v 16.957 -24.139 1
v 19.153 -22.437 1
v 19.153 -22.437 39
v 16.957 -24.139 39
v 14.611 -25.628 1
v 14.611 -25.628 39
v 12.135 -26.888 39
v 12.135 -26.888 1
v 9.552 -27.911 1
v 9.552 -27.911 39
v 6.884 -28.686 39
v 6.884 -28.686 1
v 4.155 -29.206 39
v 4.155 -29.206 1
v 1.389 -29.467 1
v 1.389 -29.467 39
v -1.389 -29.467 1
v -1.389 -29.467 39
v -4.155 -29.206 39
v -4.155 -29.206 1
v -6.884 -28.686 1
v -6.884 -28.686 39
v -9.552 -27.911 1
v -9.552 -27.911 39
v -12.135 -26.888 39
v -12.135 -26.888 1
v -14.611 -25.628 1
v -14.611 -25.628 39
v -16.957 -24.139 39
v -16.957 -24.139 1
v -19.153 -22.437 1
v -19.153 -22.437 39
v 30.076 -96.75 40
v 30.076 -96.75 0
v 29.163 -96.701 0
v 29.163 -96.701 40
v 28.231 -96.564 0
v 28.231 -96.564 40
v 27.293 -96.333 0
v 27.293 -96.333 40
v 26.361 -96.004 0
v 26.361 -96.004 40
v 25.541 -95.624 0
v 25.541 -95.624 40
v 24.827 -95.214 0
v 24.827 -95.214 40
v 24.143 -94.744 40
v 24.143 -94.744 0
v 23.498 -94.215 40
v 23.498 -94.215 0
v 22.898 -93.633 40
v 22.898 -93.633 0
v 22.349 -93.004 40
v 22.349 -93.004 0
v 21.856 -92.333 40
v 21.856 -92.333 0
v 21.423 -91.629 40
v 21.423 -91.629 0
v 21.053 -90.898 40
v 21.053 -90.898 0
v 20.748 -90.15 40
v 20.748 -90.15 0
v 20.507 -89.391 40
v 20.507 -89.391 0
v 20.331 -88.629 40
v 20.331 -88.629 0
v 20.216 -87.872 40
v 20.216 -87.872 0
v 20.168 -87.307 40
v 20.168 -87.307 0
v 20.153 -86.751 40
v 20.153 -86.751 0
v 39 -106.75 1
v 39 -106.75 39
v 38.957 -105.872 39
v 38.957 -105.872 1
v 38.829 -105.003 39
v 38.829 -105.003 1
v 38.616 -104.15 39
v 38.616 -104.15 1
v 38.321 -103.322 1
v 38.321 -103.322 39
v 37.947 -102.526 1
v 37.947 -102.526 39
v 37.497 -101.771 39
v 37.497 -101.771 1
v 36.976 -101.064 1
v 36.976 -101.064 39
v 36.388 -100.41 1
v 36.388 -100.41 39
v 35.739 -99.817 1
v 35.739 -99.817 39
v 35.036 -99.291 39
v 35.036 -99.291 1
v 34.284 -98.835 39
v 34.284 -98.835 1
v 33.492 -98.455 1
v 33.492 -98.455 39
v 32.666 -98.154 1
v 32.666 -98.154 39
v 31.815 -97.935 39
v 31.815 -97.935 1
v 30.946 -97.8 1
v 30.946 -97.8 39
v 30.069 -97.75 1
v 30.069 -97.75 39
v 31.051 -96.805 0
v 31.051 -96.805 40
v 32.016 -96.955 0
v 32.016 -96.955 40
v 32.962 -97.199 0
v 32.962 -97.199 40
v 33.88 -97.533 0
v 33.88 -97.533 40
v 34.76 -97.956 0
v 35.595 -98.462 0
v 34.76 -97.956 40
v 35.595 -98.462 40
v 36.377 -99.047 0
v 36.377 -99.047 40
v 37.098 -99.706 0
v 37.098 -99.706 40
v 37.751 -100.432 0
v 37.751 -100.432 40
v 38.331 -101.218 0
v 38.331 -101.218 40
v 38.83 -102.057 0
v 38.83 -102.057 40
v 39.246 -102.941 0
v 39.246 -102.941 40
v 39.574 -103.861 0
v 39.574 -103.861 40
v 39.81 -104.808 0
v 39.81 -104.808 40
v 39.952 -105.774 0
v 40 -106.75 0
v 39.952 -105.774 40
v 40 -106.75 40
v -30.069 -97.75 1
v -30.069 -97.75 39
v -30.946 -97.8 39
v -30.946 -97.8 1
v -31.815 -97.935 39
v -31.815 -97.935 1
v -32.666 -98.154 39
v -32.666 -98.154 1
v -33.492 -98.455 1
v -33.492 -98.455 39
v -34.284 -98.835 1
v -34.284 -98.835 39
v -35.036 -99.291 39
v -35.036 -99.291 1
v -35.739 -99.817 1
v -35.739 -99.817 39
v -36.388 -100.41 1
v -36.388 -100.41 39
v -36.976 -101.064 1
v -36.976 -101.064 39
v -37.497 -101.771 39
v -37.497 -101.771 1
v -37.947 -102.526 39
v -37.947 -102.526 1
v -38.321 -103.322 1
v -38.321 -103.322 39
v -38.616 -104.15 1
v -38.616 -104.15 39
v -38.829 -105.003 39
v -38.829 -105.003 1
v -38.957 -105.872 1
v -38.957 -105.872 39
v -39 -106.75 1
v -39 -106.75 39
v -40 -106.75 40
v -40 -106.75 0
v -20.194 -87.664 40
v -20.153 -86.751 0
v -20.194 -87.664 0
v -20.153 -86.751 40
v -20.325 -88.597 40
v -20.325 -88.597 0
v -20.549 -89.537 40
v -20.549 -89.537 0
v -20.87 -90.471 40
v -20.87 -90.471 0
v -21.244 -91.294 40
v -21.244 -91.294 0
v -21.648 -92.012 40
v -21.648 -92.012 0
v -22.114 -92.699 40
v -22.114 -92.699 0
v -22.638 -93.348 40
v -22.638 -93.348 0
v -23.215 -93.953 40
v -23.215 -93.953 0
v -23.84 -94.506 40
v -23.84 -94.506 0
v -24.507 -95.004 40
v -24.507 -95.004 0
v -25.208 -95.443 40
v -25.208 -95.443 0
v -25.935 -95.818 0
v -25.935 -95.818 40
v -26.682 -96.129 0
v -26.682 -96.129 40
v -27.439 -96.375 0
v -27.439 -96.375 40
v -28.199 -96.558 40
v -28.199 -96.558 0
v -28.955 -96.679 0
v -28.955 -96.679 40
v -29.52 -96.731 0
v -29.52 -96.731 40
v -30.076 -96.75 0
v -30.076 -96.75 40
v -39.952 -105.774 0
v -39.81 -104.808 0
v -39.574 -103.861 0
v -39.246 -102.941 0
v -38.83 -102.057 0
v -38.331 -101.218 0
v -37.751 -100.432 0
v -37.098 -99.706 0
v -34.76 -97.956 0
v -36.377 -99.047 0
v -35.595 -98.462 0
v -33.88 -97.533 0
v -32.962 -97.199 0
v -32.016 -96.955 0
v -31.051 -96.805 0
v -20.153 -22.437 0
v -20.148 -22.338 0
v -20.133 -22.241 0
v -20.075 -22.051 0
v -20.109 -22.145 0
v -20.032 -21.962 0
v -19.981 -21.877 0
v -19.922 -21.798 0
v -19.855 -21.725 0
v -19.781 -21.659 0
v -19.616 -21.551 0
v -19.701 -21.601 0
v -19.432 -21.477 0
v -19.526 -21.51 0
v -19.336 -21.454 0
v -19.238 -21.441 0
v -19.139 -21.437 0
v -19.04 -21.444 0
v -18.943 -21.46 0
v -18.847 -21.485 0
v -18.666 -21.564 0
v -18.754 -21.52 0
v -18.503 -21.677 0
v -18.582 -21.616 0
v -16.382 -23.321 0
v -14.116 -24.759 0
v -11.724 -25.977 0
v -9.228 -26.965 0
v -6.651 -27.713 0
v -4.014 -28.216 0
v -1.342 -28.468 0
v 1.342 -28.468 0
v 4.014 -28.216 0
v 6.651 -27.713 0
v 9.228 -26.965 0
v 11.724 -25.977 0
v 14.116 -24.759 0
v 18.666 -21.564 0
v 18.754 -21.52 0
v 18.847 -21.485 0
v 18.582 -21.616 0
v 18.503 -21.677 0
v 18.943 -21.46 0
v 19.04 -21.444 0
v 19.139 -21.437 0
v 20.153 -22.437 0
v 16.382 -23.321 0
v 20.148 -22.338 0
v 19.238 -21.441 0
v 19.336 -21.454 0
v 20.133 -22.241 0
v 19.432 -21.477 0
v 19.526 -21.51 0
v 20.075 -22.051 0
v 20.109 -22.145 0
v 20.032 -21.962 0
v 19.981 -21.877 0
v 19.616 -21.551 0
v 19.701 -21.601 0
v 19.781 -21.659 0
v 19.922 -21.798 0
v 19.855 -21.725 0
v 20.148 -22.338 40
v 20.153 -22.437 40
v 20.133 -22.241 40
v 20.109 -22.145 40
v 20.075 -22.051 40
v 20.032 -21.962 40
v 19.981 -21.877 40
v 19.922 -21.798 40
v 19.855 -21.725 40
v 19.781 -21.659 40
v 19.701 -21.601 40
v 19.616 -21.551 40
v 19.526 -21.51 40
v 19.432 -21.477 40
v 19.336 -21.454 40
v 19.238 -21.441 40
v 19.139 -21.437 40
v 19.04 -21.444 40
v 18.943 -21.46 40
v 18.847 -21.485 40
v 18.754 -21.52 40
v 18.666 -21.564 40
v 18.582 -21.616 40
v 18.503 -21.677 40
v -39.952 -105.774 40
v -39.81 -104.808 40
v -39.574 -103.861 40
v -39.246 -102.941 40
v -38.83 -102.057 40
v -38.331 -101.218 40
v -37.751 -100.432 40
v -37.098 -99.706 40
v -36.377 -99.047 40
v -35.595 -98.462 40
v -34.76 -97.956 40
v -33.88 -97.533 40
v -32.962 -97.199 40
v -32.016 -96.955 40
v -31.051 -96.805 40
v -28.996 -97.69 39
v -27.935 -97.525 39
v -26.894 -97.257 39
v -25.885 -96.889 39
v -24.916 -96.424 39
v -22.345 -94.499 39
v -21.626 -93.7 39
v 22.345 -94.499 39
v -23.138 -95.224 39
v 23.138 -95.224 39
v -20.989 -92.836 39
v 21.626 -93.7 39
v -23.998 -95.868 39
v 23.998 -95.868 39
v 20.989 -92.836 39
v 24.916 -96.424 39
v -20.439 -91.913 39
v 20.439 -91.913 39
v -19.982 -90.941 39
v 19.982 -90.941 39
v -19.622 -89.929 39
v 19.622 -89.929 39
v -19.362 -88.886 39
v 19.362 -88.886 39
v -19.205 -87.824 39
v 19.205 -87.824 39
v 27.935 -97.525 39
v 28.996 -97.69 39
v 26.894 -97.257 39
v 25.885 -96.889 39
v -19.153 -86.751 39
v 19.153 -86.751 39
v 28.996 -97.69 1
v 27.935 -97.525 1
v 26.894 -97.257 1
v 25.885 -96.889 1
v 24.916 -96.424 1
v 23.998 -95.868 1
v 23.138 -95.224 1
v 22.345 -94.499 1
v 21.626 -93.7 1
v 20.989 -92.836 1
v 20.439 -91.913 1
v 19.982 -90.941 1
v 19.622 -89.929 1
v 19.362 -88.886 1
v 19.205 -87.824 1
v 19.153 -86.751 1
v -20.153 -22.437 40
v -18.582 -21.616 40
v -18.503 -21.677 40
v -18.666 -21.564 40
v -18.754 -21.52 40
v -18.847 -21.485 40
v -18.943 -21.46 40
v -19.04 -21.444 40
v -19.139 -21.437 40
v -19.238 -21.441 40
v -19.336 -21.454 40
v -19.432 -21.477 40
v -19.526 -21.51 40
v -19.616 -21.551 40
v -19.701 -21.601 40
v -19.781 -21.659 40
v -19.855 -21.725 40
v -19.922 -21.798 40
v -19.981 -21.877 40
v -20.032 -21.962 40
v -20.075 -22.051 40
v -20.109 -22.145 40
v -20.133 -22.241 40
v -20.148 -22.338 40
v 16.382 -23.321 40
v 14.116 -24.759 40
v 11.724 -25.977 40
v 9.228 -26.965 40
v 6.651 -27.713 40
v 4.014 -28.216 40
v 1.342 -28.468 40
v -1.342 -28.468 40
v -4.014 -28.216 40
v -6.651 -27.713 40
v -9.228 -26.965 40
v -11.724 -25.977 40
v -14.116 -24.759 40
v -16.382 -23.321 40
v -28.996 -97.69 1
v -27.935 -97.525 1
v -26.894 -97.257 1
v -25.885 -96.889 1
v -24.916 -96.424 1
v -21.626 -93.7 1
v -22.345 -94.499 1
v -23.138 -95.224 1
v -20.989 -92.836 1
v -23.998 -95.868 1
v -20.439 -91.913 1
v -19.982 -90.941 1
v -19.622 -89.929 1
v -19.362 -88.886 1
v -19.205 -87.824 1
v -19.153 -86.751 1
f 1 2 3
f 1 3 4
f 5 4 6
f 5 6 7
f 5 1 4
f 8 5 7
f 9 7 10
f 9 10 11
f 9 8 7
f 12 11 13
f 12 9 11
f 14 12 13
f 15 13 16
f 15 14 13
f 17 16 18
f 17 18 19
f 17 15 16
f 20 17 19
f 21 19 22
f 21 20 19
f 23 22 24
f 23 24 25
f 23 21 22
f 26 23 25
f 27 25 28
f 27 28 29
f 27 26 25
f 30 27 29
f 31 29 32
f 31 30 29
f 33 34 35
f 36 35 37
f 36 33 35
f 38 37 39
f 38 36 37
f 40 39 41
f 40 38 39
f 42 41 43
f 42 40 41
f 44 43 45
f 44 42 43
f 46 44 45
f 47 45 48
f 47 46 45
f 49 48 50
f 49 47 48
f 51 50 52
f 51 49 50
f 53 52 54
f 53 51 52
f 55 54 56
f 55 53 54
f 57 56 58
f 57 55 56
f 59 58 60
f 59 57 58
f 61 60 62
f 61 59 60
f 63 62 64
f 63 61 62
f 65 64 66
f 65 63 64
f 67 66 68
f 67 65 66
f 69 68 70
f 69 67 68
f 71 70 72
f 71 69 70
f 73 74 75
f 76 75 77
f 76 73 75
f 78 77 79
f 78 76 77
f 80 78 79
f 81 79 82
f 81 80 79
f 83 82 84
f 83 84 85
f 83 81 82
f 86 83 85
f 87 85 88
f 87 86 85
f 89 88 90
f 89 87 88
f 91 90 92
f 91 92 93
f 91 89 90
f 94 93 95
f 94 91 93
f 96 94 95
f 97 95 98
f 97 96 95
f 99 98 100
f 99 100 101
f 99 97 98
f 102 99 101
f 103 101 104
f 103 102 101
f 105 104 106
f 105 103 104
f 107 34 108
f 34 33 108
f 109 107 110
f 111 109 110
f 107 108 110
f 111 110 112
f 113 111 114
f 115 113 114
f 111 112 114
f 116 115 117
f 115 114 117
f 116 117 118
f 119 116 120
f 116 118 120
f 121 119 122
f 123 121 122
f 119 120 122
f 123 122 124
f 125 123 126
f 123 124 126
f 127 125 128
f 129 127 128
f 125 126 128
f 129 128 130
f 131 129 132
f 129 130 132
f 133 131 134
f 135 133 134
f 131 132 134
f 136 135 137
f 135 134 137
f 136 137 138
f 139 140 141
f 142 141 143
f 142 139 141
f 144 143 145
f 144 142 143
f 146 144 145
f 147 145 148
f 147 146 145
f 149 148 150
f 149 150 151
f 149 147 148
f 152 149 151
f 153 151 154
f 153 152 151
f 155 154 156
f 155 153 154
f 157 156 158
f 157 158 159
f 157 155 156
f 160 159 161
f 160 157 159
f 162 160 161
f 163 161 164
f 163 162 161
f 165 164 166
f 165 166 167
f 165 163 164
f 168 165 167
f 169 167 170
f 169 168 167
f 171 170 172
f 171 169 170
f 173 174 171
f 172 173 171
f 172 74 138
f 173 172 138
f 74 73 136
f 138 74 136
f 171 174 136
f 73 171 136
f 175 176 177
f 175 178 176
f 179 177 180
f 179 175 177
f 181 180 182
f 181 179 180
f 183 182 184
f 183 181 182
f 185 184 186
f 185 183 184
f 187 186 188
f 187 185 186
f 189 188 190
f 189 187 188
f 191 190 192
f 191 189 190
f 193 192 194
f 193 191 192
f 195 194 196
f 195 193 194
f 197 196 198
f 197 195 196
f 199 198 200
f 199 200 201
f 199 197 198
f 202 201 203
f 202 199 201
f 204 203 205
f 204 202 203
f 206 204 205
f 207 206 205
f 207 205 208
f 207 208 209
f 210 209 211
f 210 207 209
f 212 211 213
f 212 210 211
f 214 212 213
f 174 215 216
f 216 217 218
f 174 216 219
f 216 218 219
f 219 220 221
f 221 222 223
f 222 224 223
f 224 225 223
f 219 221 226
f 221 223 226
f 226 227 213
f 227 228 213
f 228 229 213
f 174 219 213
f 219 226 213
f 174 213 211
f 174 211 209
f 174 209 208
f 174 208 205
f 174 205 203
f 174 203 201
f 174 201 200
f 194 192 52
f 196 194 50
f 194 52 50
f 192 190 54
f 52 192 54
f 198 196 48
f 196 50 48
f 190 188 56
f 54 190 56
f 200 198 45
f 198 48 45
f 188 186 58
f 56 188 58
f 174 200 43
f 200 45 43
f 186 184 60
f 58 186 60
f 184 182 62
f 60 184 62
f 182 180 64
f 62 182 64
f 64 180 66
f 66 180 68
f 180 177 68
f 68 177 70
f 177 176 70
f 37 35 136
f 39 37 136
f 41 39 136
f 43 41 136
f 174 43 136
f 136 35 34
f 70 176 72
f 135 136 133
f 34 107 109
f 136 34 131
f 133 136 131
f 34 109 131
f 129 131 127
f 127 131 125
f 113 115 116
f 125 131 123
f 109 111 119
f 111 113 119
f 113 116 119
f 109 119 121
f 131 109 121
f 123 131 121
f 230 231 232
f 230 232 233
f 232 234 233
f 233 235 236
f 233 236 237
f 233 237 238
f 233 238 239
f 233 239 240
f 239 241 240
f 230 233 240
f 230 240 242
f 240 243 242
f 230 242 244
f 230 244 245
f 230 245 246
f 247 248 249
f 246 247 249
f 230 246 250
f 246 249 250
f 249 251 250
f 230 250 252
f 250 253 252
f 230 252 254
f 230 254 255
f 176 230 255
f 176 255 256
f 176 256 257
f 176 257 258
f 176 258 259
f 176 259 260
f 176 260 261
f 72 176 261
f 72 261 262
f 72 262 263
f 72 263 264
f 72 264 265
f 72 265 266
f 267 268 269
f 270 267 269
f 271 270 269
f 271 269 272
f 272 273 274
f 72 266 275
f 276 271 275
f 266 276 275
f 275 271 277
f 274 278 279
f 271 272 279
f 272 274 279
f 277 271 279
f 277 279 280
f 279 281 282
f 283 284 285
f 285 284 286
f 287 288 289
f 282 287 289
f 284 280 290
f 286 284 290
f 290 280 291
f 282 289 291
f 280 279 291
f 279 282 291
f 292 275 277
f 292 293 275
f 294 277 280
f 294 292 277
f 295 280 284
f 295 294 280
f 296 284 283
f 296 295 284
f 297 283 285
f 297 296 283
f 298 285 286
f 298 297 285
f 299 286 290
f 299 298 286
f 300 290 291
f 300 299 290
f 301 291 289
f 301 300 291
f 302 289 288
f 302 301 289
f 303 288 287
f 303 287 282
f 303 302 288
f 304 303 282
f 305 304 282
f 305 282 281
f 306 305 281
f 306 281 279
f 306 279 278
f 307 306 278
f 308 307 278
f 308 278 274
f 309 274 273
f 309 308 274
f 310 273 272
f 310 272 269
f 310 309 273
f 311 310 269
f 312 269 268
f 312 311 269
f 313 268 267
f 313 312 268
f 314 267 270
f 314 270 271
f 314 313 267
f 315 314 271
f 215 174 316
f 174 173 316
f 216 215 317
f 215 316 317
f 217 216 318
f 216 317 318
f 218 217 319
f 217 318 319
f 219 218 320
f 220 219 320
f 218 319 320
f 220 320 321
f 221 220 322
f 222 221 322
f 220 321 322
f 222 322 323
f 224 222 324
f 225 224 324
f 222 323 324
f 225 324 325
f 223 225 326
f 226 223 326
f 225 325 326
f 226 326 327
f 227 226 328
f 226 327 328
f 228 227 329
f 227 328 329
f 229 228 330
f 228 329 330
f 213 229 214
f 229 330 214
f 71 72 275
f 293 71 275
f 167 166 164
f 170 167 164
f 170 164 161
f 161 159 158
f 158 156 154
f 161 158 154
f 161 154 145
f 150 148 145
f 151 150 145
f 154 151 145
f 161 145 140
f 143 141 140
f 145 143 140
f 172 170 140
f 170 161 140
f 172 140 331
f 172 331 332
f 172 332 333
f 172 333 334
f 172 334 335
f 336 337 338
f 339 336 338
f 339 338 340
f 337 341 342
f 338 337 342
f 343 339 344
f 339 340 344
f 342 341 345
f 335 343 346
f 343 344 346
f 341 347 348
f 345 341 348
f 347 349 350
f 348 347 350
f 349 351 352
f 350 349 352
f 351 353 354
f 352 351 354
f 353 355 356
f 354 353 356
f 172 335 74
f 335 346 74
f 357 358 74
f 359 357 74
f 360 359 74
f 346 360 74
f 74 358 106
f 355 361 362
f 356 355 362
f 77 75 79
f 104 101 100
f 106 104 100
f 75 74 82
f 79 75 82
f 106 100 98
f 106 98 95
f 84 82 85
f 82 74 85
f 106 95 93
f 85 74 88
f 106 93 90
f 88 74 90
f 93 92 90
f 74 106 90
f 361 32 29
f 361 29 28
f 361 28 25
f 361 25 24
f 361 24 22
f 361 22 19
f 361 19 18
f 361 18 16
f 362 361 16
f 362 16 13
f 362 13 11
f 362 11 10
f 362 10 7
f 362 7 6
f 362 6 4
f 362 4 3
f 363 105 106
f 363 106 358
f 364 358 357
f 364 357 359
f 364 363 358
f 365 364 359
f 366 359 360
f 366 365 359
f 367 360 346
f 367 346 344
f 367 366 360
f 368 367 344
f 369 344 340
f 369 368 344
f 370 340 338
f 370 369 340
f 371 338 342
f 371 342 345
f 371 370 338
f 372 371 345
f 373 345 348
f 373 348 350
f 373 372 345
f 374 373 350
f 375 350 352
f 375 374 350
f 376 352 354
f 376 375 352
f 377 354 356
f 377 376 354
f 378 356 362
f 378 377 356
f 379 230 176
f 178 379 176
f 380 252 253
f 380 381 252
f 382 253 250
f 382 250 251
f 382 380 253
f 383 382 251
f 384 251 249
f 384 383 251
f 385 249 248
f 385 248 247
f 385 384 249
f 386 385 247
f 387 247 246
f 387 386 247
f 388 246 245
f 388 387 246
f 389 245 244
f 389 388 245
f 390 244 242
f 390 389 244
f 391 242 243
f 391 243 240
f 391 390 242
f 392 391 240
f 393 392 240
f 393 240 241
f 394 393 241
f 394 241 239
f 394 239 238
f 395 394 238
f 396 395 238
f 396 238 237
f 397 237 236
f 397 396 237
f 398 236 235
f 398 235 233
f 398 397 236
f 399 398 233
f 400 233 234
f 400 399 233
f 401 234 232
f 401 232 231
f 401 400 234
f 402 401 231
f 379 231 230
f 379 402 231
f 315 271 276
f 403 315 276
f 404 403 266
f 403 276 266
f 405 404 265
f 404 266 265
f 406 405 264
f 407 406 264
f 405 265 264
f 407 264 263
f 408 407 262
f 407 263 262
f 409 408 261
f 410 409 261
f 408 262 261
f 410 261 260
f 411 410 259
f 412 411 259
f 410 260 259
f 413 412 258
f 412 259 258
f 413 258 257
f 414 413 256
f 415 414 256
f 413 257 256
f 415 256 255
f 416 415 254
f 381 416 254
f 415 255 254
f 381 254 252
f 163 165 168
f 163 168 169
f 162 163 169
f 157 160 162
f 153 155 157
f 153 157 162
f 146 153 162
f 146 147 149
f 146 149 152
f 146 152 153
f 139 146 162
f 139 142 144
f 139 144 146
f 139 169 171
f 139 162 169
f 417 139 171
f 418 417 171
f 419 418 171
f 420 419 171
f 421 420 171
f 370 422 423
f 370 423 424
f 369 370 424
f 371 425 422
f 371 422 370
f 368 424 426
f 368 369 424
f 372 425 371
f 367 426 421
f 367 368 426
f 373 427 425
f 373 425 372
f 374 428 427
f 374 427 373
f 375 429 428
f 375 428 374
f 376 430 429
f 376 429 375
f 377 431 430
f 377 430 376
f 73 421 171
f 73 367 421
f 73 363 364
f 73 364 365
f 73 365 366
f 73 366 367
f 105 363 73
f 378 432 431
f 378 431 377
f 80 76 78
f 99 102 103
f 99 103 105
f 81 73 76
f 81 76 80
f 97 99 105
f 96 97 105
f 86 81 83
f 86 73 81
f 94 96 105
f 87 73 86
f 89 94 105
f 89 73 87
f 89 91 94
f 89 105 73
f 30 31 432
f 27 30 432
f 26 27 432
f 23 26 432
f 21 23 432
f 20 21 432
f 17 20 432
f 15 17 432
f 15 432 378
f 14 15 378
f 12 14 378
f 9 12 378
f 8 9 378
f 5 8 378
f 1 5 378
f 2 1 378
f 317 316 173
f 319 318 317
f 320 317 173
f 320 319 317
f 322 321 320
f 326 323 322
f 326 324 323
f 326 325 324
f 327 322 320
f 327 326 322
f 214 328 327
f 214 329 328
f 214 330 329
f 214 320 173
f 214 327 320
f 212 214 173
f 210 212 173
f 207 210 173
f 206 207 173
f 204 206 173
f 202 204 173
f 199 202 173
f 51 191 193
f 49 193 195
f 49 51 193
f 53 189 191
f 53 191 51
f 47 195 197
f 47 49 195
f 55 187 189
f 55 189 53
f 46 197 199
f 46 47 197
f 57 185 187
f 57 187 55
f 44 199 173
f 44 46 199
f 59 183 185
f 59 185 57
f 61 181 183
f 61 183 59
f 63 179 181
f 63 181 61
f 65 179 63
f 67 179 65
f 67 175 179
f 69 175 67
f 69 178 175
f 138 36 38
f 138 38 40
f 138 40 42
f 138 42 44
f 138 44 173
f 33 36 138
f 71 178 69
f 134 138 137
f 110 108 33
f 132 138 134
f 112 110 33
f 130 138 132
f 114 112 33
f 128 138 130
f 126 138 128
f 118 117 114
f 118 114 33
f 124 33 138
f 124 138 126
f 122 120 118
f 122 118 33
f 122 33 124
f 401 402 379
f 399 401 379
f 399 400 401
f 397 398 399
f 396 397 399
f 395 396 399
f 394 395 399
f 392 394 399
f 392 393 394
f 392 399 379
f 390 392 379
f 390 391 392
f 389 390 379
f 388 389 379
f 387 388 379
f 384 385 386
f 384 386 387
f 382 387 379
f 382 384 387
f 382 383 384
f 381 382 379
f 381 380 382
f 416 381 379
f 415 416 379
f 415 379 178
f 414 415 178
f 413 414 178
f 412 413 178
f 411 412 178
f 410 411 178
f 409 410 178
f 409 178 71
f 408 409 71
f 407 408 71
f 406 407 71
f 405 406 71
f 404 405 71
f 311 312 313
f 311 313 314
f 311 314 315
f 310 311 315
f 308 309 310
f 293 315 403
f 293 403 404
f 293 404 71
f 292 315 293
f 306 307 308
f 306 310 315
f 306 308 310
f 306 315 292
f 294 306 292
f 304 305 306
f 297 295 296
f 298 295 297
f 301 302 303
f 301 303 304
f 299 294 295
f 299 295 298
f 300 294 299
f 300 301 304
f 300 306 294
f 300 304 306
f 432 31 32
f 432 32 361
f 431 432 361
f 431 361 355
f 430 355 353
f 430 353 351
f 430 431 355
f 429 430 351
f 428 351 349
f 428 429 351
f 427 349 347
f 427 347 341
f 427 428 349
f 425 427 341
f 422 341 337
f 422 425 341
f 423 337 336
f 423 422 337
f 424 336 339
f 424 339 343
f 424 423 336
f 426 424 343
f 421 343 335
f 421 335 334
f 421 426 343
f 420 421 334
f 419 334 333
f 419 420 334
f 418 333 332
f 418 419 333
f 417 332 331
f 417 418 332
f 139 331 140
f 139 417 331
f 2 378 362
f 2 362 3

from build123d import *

# Parameters (mm, degrees)
EXTRUDE_1_DEPTH = 40
FILLET_1_R      = 1
FILLET_2_R      = 10
FILLET_3_R      = 10
SHELL_START     = 1
SHELL_1_DEPTH   = 38


# Read off the part's stored shape, not the designer's step: 抽壳1
with BuildPart() as part:
    # 草图1 → 凸台-拉伸1 (new body)
    with BuildSketch(Plane.XY):
        with BuildLine():
            Line((-40, -106.75), (40, -106.75))
            Line((40, -106.75), (40, -96.75))
            Line((40, -96.75), (20.152543264, -96.75))
            Line((20.152543264, -96.75), (20.152543264, -20.152543264))
            ThreePointArc((20.152543264, -20.152543264), (0, -28.5), (-20.152543264, -20.152543264))
            Line((-20.152543264, -20.152543264), (-20.152543264, -96.75))
            Line((-20.152543264, -96.75), (-40, -96.75))
            Line((-40, -96.75), (-40, -106.75))
        make_face()
    extrude(amount=EXTRUDE_1_DEPTH)

    # 圆角1
    fillet_1_edges = [part.edges().sort_by_distance(p)[0] for p in [
        (-20.152543264, -20.152543264, 20),
        (20.152543264, -20.152543264, 20),
    ]]
    fillet(fillet_1_edges, radius=FILLET_1_R)

    # 圆角2
    fillet_2_edges = [part.edges().sort_by_distance(p)[0] for p in [
        (40, -96.75, 20),
        (-40, -96.75, 20),
    ]]
    fillet(fillet_2_edges, radius=FILLET_2_R - 0.0001)  # a hair under: the kernel refuses the full size

    # 圆角3
    fillet_3_edges = [part.edges().sort_by_distance(p)[0] for p in [
        (20.152543264, -96.75, 20),
        (-20.152543264, -96.75, 20),
    ]]
    fillet(fillet_3_edges, radius=FILLET_3_R)

    # 抽壳1 outline → 抽壳1 (cut)
    with BuildSketch(Plane.XY.offset(SHELL_START)):
        with BuildLine():
            Line((19.152543264, -86.750581745), (19.152543264, -22.437247749))
            ThreePointArc((19.152543264, -22.437247749), (0, -29.5), (-19.152543264, -22.437247749))
            Line((-19.152543264, -22.437247749), (-19.152543264, -86.750581745))
            ThreePointArc((-19.152543264, -86.750581745), (-22.344762313, -94.499036857), (-30.068644469, -97.750261785))
            ThreePointArc((-30.068644469, -97.750261785), (-36.388184414, -100.410354908), (-39, -106.75))
            Line((-39, -106.75), (39, -106.75))
            ThreePointArc((39, -106.75), (36.388184414, -100.410354908), (30.068644469, -97.750261785))
            ThreePointArc((30.068644469, -97.750261785), (22.344762313, -94.499036857), (19.152543264, -86.750581745))
        make_face()
    extrude(amount=SHELL_1_DEPTH, mode=Mode.SUBTRACT)


solid = part.part
